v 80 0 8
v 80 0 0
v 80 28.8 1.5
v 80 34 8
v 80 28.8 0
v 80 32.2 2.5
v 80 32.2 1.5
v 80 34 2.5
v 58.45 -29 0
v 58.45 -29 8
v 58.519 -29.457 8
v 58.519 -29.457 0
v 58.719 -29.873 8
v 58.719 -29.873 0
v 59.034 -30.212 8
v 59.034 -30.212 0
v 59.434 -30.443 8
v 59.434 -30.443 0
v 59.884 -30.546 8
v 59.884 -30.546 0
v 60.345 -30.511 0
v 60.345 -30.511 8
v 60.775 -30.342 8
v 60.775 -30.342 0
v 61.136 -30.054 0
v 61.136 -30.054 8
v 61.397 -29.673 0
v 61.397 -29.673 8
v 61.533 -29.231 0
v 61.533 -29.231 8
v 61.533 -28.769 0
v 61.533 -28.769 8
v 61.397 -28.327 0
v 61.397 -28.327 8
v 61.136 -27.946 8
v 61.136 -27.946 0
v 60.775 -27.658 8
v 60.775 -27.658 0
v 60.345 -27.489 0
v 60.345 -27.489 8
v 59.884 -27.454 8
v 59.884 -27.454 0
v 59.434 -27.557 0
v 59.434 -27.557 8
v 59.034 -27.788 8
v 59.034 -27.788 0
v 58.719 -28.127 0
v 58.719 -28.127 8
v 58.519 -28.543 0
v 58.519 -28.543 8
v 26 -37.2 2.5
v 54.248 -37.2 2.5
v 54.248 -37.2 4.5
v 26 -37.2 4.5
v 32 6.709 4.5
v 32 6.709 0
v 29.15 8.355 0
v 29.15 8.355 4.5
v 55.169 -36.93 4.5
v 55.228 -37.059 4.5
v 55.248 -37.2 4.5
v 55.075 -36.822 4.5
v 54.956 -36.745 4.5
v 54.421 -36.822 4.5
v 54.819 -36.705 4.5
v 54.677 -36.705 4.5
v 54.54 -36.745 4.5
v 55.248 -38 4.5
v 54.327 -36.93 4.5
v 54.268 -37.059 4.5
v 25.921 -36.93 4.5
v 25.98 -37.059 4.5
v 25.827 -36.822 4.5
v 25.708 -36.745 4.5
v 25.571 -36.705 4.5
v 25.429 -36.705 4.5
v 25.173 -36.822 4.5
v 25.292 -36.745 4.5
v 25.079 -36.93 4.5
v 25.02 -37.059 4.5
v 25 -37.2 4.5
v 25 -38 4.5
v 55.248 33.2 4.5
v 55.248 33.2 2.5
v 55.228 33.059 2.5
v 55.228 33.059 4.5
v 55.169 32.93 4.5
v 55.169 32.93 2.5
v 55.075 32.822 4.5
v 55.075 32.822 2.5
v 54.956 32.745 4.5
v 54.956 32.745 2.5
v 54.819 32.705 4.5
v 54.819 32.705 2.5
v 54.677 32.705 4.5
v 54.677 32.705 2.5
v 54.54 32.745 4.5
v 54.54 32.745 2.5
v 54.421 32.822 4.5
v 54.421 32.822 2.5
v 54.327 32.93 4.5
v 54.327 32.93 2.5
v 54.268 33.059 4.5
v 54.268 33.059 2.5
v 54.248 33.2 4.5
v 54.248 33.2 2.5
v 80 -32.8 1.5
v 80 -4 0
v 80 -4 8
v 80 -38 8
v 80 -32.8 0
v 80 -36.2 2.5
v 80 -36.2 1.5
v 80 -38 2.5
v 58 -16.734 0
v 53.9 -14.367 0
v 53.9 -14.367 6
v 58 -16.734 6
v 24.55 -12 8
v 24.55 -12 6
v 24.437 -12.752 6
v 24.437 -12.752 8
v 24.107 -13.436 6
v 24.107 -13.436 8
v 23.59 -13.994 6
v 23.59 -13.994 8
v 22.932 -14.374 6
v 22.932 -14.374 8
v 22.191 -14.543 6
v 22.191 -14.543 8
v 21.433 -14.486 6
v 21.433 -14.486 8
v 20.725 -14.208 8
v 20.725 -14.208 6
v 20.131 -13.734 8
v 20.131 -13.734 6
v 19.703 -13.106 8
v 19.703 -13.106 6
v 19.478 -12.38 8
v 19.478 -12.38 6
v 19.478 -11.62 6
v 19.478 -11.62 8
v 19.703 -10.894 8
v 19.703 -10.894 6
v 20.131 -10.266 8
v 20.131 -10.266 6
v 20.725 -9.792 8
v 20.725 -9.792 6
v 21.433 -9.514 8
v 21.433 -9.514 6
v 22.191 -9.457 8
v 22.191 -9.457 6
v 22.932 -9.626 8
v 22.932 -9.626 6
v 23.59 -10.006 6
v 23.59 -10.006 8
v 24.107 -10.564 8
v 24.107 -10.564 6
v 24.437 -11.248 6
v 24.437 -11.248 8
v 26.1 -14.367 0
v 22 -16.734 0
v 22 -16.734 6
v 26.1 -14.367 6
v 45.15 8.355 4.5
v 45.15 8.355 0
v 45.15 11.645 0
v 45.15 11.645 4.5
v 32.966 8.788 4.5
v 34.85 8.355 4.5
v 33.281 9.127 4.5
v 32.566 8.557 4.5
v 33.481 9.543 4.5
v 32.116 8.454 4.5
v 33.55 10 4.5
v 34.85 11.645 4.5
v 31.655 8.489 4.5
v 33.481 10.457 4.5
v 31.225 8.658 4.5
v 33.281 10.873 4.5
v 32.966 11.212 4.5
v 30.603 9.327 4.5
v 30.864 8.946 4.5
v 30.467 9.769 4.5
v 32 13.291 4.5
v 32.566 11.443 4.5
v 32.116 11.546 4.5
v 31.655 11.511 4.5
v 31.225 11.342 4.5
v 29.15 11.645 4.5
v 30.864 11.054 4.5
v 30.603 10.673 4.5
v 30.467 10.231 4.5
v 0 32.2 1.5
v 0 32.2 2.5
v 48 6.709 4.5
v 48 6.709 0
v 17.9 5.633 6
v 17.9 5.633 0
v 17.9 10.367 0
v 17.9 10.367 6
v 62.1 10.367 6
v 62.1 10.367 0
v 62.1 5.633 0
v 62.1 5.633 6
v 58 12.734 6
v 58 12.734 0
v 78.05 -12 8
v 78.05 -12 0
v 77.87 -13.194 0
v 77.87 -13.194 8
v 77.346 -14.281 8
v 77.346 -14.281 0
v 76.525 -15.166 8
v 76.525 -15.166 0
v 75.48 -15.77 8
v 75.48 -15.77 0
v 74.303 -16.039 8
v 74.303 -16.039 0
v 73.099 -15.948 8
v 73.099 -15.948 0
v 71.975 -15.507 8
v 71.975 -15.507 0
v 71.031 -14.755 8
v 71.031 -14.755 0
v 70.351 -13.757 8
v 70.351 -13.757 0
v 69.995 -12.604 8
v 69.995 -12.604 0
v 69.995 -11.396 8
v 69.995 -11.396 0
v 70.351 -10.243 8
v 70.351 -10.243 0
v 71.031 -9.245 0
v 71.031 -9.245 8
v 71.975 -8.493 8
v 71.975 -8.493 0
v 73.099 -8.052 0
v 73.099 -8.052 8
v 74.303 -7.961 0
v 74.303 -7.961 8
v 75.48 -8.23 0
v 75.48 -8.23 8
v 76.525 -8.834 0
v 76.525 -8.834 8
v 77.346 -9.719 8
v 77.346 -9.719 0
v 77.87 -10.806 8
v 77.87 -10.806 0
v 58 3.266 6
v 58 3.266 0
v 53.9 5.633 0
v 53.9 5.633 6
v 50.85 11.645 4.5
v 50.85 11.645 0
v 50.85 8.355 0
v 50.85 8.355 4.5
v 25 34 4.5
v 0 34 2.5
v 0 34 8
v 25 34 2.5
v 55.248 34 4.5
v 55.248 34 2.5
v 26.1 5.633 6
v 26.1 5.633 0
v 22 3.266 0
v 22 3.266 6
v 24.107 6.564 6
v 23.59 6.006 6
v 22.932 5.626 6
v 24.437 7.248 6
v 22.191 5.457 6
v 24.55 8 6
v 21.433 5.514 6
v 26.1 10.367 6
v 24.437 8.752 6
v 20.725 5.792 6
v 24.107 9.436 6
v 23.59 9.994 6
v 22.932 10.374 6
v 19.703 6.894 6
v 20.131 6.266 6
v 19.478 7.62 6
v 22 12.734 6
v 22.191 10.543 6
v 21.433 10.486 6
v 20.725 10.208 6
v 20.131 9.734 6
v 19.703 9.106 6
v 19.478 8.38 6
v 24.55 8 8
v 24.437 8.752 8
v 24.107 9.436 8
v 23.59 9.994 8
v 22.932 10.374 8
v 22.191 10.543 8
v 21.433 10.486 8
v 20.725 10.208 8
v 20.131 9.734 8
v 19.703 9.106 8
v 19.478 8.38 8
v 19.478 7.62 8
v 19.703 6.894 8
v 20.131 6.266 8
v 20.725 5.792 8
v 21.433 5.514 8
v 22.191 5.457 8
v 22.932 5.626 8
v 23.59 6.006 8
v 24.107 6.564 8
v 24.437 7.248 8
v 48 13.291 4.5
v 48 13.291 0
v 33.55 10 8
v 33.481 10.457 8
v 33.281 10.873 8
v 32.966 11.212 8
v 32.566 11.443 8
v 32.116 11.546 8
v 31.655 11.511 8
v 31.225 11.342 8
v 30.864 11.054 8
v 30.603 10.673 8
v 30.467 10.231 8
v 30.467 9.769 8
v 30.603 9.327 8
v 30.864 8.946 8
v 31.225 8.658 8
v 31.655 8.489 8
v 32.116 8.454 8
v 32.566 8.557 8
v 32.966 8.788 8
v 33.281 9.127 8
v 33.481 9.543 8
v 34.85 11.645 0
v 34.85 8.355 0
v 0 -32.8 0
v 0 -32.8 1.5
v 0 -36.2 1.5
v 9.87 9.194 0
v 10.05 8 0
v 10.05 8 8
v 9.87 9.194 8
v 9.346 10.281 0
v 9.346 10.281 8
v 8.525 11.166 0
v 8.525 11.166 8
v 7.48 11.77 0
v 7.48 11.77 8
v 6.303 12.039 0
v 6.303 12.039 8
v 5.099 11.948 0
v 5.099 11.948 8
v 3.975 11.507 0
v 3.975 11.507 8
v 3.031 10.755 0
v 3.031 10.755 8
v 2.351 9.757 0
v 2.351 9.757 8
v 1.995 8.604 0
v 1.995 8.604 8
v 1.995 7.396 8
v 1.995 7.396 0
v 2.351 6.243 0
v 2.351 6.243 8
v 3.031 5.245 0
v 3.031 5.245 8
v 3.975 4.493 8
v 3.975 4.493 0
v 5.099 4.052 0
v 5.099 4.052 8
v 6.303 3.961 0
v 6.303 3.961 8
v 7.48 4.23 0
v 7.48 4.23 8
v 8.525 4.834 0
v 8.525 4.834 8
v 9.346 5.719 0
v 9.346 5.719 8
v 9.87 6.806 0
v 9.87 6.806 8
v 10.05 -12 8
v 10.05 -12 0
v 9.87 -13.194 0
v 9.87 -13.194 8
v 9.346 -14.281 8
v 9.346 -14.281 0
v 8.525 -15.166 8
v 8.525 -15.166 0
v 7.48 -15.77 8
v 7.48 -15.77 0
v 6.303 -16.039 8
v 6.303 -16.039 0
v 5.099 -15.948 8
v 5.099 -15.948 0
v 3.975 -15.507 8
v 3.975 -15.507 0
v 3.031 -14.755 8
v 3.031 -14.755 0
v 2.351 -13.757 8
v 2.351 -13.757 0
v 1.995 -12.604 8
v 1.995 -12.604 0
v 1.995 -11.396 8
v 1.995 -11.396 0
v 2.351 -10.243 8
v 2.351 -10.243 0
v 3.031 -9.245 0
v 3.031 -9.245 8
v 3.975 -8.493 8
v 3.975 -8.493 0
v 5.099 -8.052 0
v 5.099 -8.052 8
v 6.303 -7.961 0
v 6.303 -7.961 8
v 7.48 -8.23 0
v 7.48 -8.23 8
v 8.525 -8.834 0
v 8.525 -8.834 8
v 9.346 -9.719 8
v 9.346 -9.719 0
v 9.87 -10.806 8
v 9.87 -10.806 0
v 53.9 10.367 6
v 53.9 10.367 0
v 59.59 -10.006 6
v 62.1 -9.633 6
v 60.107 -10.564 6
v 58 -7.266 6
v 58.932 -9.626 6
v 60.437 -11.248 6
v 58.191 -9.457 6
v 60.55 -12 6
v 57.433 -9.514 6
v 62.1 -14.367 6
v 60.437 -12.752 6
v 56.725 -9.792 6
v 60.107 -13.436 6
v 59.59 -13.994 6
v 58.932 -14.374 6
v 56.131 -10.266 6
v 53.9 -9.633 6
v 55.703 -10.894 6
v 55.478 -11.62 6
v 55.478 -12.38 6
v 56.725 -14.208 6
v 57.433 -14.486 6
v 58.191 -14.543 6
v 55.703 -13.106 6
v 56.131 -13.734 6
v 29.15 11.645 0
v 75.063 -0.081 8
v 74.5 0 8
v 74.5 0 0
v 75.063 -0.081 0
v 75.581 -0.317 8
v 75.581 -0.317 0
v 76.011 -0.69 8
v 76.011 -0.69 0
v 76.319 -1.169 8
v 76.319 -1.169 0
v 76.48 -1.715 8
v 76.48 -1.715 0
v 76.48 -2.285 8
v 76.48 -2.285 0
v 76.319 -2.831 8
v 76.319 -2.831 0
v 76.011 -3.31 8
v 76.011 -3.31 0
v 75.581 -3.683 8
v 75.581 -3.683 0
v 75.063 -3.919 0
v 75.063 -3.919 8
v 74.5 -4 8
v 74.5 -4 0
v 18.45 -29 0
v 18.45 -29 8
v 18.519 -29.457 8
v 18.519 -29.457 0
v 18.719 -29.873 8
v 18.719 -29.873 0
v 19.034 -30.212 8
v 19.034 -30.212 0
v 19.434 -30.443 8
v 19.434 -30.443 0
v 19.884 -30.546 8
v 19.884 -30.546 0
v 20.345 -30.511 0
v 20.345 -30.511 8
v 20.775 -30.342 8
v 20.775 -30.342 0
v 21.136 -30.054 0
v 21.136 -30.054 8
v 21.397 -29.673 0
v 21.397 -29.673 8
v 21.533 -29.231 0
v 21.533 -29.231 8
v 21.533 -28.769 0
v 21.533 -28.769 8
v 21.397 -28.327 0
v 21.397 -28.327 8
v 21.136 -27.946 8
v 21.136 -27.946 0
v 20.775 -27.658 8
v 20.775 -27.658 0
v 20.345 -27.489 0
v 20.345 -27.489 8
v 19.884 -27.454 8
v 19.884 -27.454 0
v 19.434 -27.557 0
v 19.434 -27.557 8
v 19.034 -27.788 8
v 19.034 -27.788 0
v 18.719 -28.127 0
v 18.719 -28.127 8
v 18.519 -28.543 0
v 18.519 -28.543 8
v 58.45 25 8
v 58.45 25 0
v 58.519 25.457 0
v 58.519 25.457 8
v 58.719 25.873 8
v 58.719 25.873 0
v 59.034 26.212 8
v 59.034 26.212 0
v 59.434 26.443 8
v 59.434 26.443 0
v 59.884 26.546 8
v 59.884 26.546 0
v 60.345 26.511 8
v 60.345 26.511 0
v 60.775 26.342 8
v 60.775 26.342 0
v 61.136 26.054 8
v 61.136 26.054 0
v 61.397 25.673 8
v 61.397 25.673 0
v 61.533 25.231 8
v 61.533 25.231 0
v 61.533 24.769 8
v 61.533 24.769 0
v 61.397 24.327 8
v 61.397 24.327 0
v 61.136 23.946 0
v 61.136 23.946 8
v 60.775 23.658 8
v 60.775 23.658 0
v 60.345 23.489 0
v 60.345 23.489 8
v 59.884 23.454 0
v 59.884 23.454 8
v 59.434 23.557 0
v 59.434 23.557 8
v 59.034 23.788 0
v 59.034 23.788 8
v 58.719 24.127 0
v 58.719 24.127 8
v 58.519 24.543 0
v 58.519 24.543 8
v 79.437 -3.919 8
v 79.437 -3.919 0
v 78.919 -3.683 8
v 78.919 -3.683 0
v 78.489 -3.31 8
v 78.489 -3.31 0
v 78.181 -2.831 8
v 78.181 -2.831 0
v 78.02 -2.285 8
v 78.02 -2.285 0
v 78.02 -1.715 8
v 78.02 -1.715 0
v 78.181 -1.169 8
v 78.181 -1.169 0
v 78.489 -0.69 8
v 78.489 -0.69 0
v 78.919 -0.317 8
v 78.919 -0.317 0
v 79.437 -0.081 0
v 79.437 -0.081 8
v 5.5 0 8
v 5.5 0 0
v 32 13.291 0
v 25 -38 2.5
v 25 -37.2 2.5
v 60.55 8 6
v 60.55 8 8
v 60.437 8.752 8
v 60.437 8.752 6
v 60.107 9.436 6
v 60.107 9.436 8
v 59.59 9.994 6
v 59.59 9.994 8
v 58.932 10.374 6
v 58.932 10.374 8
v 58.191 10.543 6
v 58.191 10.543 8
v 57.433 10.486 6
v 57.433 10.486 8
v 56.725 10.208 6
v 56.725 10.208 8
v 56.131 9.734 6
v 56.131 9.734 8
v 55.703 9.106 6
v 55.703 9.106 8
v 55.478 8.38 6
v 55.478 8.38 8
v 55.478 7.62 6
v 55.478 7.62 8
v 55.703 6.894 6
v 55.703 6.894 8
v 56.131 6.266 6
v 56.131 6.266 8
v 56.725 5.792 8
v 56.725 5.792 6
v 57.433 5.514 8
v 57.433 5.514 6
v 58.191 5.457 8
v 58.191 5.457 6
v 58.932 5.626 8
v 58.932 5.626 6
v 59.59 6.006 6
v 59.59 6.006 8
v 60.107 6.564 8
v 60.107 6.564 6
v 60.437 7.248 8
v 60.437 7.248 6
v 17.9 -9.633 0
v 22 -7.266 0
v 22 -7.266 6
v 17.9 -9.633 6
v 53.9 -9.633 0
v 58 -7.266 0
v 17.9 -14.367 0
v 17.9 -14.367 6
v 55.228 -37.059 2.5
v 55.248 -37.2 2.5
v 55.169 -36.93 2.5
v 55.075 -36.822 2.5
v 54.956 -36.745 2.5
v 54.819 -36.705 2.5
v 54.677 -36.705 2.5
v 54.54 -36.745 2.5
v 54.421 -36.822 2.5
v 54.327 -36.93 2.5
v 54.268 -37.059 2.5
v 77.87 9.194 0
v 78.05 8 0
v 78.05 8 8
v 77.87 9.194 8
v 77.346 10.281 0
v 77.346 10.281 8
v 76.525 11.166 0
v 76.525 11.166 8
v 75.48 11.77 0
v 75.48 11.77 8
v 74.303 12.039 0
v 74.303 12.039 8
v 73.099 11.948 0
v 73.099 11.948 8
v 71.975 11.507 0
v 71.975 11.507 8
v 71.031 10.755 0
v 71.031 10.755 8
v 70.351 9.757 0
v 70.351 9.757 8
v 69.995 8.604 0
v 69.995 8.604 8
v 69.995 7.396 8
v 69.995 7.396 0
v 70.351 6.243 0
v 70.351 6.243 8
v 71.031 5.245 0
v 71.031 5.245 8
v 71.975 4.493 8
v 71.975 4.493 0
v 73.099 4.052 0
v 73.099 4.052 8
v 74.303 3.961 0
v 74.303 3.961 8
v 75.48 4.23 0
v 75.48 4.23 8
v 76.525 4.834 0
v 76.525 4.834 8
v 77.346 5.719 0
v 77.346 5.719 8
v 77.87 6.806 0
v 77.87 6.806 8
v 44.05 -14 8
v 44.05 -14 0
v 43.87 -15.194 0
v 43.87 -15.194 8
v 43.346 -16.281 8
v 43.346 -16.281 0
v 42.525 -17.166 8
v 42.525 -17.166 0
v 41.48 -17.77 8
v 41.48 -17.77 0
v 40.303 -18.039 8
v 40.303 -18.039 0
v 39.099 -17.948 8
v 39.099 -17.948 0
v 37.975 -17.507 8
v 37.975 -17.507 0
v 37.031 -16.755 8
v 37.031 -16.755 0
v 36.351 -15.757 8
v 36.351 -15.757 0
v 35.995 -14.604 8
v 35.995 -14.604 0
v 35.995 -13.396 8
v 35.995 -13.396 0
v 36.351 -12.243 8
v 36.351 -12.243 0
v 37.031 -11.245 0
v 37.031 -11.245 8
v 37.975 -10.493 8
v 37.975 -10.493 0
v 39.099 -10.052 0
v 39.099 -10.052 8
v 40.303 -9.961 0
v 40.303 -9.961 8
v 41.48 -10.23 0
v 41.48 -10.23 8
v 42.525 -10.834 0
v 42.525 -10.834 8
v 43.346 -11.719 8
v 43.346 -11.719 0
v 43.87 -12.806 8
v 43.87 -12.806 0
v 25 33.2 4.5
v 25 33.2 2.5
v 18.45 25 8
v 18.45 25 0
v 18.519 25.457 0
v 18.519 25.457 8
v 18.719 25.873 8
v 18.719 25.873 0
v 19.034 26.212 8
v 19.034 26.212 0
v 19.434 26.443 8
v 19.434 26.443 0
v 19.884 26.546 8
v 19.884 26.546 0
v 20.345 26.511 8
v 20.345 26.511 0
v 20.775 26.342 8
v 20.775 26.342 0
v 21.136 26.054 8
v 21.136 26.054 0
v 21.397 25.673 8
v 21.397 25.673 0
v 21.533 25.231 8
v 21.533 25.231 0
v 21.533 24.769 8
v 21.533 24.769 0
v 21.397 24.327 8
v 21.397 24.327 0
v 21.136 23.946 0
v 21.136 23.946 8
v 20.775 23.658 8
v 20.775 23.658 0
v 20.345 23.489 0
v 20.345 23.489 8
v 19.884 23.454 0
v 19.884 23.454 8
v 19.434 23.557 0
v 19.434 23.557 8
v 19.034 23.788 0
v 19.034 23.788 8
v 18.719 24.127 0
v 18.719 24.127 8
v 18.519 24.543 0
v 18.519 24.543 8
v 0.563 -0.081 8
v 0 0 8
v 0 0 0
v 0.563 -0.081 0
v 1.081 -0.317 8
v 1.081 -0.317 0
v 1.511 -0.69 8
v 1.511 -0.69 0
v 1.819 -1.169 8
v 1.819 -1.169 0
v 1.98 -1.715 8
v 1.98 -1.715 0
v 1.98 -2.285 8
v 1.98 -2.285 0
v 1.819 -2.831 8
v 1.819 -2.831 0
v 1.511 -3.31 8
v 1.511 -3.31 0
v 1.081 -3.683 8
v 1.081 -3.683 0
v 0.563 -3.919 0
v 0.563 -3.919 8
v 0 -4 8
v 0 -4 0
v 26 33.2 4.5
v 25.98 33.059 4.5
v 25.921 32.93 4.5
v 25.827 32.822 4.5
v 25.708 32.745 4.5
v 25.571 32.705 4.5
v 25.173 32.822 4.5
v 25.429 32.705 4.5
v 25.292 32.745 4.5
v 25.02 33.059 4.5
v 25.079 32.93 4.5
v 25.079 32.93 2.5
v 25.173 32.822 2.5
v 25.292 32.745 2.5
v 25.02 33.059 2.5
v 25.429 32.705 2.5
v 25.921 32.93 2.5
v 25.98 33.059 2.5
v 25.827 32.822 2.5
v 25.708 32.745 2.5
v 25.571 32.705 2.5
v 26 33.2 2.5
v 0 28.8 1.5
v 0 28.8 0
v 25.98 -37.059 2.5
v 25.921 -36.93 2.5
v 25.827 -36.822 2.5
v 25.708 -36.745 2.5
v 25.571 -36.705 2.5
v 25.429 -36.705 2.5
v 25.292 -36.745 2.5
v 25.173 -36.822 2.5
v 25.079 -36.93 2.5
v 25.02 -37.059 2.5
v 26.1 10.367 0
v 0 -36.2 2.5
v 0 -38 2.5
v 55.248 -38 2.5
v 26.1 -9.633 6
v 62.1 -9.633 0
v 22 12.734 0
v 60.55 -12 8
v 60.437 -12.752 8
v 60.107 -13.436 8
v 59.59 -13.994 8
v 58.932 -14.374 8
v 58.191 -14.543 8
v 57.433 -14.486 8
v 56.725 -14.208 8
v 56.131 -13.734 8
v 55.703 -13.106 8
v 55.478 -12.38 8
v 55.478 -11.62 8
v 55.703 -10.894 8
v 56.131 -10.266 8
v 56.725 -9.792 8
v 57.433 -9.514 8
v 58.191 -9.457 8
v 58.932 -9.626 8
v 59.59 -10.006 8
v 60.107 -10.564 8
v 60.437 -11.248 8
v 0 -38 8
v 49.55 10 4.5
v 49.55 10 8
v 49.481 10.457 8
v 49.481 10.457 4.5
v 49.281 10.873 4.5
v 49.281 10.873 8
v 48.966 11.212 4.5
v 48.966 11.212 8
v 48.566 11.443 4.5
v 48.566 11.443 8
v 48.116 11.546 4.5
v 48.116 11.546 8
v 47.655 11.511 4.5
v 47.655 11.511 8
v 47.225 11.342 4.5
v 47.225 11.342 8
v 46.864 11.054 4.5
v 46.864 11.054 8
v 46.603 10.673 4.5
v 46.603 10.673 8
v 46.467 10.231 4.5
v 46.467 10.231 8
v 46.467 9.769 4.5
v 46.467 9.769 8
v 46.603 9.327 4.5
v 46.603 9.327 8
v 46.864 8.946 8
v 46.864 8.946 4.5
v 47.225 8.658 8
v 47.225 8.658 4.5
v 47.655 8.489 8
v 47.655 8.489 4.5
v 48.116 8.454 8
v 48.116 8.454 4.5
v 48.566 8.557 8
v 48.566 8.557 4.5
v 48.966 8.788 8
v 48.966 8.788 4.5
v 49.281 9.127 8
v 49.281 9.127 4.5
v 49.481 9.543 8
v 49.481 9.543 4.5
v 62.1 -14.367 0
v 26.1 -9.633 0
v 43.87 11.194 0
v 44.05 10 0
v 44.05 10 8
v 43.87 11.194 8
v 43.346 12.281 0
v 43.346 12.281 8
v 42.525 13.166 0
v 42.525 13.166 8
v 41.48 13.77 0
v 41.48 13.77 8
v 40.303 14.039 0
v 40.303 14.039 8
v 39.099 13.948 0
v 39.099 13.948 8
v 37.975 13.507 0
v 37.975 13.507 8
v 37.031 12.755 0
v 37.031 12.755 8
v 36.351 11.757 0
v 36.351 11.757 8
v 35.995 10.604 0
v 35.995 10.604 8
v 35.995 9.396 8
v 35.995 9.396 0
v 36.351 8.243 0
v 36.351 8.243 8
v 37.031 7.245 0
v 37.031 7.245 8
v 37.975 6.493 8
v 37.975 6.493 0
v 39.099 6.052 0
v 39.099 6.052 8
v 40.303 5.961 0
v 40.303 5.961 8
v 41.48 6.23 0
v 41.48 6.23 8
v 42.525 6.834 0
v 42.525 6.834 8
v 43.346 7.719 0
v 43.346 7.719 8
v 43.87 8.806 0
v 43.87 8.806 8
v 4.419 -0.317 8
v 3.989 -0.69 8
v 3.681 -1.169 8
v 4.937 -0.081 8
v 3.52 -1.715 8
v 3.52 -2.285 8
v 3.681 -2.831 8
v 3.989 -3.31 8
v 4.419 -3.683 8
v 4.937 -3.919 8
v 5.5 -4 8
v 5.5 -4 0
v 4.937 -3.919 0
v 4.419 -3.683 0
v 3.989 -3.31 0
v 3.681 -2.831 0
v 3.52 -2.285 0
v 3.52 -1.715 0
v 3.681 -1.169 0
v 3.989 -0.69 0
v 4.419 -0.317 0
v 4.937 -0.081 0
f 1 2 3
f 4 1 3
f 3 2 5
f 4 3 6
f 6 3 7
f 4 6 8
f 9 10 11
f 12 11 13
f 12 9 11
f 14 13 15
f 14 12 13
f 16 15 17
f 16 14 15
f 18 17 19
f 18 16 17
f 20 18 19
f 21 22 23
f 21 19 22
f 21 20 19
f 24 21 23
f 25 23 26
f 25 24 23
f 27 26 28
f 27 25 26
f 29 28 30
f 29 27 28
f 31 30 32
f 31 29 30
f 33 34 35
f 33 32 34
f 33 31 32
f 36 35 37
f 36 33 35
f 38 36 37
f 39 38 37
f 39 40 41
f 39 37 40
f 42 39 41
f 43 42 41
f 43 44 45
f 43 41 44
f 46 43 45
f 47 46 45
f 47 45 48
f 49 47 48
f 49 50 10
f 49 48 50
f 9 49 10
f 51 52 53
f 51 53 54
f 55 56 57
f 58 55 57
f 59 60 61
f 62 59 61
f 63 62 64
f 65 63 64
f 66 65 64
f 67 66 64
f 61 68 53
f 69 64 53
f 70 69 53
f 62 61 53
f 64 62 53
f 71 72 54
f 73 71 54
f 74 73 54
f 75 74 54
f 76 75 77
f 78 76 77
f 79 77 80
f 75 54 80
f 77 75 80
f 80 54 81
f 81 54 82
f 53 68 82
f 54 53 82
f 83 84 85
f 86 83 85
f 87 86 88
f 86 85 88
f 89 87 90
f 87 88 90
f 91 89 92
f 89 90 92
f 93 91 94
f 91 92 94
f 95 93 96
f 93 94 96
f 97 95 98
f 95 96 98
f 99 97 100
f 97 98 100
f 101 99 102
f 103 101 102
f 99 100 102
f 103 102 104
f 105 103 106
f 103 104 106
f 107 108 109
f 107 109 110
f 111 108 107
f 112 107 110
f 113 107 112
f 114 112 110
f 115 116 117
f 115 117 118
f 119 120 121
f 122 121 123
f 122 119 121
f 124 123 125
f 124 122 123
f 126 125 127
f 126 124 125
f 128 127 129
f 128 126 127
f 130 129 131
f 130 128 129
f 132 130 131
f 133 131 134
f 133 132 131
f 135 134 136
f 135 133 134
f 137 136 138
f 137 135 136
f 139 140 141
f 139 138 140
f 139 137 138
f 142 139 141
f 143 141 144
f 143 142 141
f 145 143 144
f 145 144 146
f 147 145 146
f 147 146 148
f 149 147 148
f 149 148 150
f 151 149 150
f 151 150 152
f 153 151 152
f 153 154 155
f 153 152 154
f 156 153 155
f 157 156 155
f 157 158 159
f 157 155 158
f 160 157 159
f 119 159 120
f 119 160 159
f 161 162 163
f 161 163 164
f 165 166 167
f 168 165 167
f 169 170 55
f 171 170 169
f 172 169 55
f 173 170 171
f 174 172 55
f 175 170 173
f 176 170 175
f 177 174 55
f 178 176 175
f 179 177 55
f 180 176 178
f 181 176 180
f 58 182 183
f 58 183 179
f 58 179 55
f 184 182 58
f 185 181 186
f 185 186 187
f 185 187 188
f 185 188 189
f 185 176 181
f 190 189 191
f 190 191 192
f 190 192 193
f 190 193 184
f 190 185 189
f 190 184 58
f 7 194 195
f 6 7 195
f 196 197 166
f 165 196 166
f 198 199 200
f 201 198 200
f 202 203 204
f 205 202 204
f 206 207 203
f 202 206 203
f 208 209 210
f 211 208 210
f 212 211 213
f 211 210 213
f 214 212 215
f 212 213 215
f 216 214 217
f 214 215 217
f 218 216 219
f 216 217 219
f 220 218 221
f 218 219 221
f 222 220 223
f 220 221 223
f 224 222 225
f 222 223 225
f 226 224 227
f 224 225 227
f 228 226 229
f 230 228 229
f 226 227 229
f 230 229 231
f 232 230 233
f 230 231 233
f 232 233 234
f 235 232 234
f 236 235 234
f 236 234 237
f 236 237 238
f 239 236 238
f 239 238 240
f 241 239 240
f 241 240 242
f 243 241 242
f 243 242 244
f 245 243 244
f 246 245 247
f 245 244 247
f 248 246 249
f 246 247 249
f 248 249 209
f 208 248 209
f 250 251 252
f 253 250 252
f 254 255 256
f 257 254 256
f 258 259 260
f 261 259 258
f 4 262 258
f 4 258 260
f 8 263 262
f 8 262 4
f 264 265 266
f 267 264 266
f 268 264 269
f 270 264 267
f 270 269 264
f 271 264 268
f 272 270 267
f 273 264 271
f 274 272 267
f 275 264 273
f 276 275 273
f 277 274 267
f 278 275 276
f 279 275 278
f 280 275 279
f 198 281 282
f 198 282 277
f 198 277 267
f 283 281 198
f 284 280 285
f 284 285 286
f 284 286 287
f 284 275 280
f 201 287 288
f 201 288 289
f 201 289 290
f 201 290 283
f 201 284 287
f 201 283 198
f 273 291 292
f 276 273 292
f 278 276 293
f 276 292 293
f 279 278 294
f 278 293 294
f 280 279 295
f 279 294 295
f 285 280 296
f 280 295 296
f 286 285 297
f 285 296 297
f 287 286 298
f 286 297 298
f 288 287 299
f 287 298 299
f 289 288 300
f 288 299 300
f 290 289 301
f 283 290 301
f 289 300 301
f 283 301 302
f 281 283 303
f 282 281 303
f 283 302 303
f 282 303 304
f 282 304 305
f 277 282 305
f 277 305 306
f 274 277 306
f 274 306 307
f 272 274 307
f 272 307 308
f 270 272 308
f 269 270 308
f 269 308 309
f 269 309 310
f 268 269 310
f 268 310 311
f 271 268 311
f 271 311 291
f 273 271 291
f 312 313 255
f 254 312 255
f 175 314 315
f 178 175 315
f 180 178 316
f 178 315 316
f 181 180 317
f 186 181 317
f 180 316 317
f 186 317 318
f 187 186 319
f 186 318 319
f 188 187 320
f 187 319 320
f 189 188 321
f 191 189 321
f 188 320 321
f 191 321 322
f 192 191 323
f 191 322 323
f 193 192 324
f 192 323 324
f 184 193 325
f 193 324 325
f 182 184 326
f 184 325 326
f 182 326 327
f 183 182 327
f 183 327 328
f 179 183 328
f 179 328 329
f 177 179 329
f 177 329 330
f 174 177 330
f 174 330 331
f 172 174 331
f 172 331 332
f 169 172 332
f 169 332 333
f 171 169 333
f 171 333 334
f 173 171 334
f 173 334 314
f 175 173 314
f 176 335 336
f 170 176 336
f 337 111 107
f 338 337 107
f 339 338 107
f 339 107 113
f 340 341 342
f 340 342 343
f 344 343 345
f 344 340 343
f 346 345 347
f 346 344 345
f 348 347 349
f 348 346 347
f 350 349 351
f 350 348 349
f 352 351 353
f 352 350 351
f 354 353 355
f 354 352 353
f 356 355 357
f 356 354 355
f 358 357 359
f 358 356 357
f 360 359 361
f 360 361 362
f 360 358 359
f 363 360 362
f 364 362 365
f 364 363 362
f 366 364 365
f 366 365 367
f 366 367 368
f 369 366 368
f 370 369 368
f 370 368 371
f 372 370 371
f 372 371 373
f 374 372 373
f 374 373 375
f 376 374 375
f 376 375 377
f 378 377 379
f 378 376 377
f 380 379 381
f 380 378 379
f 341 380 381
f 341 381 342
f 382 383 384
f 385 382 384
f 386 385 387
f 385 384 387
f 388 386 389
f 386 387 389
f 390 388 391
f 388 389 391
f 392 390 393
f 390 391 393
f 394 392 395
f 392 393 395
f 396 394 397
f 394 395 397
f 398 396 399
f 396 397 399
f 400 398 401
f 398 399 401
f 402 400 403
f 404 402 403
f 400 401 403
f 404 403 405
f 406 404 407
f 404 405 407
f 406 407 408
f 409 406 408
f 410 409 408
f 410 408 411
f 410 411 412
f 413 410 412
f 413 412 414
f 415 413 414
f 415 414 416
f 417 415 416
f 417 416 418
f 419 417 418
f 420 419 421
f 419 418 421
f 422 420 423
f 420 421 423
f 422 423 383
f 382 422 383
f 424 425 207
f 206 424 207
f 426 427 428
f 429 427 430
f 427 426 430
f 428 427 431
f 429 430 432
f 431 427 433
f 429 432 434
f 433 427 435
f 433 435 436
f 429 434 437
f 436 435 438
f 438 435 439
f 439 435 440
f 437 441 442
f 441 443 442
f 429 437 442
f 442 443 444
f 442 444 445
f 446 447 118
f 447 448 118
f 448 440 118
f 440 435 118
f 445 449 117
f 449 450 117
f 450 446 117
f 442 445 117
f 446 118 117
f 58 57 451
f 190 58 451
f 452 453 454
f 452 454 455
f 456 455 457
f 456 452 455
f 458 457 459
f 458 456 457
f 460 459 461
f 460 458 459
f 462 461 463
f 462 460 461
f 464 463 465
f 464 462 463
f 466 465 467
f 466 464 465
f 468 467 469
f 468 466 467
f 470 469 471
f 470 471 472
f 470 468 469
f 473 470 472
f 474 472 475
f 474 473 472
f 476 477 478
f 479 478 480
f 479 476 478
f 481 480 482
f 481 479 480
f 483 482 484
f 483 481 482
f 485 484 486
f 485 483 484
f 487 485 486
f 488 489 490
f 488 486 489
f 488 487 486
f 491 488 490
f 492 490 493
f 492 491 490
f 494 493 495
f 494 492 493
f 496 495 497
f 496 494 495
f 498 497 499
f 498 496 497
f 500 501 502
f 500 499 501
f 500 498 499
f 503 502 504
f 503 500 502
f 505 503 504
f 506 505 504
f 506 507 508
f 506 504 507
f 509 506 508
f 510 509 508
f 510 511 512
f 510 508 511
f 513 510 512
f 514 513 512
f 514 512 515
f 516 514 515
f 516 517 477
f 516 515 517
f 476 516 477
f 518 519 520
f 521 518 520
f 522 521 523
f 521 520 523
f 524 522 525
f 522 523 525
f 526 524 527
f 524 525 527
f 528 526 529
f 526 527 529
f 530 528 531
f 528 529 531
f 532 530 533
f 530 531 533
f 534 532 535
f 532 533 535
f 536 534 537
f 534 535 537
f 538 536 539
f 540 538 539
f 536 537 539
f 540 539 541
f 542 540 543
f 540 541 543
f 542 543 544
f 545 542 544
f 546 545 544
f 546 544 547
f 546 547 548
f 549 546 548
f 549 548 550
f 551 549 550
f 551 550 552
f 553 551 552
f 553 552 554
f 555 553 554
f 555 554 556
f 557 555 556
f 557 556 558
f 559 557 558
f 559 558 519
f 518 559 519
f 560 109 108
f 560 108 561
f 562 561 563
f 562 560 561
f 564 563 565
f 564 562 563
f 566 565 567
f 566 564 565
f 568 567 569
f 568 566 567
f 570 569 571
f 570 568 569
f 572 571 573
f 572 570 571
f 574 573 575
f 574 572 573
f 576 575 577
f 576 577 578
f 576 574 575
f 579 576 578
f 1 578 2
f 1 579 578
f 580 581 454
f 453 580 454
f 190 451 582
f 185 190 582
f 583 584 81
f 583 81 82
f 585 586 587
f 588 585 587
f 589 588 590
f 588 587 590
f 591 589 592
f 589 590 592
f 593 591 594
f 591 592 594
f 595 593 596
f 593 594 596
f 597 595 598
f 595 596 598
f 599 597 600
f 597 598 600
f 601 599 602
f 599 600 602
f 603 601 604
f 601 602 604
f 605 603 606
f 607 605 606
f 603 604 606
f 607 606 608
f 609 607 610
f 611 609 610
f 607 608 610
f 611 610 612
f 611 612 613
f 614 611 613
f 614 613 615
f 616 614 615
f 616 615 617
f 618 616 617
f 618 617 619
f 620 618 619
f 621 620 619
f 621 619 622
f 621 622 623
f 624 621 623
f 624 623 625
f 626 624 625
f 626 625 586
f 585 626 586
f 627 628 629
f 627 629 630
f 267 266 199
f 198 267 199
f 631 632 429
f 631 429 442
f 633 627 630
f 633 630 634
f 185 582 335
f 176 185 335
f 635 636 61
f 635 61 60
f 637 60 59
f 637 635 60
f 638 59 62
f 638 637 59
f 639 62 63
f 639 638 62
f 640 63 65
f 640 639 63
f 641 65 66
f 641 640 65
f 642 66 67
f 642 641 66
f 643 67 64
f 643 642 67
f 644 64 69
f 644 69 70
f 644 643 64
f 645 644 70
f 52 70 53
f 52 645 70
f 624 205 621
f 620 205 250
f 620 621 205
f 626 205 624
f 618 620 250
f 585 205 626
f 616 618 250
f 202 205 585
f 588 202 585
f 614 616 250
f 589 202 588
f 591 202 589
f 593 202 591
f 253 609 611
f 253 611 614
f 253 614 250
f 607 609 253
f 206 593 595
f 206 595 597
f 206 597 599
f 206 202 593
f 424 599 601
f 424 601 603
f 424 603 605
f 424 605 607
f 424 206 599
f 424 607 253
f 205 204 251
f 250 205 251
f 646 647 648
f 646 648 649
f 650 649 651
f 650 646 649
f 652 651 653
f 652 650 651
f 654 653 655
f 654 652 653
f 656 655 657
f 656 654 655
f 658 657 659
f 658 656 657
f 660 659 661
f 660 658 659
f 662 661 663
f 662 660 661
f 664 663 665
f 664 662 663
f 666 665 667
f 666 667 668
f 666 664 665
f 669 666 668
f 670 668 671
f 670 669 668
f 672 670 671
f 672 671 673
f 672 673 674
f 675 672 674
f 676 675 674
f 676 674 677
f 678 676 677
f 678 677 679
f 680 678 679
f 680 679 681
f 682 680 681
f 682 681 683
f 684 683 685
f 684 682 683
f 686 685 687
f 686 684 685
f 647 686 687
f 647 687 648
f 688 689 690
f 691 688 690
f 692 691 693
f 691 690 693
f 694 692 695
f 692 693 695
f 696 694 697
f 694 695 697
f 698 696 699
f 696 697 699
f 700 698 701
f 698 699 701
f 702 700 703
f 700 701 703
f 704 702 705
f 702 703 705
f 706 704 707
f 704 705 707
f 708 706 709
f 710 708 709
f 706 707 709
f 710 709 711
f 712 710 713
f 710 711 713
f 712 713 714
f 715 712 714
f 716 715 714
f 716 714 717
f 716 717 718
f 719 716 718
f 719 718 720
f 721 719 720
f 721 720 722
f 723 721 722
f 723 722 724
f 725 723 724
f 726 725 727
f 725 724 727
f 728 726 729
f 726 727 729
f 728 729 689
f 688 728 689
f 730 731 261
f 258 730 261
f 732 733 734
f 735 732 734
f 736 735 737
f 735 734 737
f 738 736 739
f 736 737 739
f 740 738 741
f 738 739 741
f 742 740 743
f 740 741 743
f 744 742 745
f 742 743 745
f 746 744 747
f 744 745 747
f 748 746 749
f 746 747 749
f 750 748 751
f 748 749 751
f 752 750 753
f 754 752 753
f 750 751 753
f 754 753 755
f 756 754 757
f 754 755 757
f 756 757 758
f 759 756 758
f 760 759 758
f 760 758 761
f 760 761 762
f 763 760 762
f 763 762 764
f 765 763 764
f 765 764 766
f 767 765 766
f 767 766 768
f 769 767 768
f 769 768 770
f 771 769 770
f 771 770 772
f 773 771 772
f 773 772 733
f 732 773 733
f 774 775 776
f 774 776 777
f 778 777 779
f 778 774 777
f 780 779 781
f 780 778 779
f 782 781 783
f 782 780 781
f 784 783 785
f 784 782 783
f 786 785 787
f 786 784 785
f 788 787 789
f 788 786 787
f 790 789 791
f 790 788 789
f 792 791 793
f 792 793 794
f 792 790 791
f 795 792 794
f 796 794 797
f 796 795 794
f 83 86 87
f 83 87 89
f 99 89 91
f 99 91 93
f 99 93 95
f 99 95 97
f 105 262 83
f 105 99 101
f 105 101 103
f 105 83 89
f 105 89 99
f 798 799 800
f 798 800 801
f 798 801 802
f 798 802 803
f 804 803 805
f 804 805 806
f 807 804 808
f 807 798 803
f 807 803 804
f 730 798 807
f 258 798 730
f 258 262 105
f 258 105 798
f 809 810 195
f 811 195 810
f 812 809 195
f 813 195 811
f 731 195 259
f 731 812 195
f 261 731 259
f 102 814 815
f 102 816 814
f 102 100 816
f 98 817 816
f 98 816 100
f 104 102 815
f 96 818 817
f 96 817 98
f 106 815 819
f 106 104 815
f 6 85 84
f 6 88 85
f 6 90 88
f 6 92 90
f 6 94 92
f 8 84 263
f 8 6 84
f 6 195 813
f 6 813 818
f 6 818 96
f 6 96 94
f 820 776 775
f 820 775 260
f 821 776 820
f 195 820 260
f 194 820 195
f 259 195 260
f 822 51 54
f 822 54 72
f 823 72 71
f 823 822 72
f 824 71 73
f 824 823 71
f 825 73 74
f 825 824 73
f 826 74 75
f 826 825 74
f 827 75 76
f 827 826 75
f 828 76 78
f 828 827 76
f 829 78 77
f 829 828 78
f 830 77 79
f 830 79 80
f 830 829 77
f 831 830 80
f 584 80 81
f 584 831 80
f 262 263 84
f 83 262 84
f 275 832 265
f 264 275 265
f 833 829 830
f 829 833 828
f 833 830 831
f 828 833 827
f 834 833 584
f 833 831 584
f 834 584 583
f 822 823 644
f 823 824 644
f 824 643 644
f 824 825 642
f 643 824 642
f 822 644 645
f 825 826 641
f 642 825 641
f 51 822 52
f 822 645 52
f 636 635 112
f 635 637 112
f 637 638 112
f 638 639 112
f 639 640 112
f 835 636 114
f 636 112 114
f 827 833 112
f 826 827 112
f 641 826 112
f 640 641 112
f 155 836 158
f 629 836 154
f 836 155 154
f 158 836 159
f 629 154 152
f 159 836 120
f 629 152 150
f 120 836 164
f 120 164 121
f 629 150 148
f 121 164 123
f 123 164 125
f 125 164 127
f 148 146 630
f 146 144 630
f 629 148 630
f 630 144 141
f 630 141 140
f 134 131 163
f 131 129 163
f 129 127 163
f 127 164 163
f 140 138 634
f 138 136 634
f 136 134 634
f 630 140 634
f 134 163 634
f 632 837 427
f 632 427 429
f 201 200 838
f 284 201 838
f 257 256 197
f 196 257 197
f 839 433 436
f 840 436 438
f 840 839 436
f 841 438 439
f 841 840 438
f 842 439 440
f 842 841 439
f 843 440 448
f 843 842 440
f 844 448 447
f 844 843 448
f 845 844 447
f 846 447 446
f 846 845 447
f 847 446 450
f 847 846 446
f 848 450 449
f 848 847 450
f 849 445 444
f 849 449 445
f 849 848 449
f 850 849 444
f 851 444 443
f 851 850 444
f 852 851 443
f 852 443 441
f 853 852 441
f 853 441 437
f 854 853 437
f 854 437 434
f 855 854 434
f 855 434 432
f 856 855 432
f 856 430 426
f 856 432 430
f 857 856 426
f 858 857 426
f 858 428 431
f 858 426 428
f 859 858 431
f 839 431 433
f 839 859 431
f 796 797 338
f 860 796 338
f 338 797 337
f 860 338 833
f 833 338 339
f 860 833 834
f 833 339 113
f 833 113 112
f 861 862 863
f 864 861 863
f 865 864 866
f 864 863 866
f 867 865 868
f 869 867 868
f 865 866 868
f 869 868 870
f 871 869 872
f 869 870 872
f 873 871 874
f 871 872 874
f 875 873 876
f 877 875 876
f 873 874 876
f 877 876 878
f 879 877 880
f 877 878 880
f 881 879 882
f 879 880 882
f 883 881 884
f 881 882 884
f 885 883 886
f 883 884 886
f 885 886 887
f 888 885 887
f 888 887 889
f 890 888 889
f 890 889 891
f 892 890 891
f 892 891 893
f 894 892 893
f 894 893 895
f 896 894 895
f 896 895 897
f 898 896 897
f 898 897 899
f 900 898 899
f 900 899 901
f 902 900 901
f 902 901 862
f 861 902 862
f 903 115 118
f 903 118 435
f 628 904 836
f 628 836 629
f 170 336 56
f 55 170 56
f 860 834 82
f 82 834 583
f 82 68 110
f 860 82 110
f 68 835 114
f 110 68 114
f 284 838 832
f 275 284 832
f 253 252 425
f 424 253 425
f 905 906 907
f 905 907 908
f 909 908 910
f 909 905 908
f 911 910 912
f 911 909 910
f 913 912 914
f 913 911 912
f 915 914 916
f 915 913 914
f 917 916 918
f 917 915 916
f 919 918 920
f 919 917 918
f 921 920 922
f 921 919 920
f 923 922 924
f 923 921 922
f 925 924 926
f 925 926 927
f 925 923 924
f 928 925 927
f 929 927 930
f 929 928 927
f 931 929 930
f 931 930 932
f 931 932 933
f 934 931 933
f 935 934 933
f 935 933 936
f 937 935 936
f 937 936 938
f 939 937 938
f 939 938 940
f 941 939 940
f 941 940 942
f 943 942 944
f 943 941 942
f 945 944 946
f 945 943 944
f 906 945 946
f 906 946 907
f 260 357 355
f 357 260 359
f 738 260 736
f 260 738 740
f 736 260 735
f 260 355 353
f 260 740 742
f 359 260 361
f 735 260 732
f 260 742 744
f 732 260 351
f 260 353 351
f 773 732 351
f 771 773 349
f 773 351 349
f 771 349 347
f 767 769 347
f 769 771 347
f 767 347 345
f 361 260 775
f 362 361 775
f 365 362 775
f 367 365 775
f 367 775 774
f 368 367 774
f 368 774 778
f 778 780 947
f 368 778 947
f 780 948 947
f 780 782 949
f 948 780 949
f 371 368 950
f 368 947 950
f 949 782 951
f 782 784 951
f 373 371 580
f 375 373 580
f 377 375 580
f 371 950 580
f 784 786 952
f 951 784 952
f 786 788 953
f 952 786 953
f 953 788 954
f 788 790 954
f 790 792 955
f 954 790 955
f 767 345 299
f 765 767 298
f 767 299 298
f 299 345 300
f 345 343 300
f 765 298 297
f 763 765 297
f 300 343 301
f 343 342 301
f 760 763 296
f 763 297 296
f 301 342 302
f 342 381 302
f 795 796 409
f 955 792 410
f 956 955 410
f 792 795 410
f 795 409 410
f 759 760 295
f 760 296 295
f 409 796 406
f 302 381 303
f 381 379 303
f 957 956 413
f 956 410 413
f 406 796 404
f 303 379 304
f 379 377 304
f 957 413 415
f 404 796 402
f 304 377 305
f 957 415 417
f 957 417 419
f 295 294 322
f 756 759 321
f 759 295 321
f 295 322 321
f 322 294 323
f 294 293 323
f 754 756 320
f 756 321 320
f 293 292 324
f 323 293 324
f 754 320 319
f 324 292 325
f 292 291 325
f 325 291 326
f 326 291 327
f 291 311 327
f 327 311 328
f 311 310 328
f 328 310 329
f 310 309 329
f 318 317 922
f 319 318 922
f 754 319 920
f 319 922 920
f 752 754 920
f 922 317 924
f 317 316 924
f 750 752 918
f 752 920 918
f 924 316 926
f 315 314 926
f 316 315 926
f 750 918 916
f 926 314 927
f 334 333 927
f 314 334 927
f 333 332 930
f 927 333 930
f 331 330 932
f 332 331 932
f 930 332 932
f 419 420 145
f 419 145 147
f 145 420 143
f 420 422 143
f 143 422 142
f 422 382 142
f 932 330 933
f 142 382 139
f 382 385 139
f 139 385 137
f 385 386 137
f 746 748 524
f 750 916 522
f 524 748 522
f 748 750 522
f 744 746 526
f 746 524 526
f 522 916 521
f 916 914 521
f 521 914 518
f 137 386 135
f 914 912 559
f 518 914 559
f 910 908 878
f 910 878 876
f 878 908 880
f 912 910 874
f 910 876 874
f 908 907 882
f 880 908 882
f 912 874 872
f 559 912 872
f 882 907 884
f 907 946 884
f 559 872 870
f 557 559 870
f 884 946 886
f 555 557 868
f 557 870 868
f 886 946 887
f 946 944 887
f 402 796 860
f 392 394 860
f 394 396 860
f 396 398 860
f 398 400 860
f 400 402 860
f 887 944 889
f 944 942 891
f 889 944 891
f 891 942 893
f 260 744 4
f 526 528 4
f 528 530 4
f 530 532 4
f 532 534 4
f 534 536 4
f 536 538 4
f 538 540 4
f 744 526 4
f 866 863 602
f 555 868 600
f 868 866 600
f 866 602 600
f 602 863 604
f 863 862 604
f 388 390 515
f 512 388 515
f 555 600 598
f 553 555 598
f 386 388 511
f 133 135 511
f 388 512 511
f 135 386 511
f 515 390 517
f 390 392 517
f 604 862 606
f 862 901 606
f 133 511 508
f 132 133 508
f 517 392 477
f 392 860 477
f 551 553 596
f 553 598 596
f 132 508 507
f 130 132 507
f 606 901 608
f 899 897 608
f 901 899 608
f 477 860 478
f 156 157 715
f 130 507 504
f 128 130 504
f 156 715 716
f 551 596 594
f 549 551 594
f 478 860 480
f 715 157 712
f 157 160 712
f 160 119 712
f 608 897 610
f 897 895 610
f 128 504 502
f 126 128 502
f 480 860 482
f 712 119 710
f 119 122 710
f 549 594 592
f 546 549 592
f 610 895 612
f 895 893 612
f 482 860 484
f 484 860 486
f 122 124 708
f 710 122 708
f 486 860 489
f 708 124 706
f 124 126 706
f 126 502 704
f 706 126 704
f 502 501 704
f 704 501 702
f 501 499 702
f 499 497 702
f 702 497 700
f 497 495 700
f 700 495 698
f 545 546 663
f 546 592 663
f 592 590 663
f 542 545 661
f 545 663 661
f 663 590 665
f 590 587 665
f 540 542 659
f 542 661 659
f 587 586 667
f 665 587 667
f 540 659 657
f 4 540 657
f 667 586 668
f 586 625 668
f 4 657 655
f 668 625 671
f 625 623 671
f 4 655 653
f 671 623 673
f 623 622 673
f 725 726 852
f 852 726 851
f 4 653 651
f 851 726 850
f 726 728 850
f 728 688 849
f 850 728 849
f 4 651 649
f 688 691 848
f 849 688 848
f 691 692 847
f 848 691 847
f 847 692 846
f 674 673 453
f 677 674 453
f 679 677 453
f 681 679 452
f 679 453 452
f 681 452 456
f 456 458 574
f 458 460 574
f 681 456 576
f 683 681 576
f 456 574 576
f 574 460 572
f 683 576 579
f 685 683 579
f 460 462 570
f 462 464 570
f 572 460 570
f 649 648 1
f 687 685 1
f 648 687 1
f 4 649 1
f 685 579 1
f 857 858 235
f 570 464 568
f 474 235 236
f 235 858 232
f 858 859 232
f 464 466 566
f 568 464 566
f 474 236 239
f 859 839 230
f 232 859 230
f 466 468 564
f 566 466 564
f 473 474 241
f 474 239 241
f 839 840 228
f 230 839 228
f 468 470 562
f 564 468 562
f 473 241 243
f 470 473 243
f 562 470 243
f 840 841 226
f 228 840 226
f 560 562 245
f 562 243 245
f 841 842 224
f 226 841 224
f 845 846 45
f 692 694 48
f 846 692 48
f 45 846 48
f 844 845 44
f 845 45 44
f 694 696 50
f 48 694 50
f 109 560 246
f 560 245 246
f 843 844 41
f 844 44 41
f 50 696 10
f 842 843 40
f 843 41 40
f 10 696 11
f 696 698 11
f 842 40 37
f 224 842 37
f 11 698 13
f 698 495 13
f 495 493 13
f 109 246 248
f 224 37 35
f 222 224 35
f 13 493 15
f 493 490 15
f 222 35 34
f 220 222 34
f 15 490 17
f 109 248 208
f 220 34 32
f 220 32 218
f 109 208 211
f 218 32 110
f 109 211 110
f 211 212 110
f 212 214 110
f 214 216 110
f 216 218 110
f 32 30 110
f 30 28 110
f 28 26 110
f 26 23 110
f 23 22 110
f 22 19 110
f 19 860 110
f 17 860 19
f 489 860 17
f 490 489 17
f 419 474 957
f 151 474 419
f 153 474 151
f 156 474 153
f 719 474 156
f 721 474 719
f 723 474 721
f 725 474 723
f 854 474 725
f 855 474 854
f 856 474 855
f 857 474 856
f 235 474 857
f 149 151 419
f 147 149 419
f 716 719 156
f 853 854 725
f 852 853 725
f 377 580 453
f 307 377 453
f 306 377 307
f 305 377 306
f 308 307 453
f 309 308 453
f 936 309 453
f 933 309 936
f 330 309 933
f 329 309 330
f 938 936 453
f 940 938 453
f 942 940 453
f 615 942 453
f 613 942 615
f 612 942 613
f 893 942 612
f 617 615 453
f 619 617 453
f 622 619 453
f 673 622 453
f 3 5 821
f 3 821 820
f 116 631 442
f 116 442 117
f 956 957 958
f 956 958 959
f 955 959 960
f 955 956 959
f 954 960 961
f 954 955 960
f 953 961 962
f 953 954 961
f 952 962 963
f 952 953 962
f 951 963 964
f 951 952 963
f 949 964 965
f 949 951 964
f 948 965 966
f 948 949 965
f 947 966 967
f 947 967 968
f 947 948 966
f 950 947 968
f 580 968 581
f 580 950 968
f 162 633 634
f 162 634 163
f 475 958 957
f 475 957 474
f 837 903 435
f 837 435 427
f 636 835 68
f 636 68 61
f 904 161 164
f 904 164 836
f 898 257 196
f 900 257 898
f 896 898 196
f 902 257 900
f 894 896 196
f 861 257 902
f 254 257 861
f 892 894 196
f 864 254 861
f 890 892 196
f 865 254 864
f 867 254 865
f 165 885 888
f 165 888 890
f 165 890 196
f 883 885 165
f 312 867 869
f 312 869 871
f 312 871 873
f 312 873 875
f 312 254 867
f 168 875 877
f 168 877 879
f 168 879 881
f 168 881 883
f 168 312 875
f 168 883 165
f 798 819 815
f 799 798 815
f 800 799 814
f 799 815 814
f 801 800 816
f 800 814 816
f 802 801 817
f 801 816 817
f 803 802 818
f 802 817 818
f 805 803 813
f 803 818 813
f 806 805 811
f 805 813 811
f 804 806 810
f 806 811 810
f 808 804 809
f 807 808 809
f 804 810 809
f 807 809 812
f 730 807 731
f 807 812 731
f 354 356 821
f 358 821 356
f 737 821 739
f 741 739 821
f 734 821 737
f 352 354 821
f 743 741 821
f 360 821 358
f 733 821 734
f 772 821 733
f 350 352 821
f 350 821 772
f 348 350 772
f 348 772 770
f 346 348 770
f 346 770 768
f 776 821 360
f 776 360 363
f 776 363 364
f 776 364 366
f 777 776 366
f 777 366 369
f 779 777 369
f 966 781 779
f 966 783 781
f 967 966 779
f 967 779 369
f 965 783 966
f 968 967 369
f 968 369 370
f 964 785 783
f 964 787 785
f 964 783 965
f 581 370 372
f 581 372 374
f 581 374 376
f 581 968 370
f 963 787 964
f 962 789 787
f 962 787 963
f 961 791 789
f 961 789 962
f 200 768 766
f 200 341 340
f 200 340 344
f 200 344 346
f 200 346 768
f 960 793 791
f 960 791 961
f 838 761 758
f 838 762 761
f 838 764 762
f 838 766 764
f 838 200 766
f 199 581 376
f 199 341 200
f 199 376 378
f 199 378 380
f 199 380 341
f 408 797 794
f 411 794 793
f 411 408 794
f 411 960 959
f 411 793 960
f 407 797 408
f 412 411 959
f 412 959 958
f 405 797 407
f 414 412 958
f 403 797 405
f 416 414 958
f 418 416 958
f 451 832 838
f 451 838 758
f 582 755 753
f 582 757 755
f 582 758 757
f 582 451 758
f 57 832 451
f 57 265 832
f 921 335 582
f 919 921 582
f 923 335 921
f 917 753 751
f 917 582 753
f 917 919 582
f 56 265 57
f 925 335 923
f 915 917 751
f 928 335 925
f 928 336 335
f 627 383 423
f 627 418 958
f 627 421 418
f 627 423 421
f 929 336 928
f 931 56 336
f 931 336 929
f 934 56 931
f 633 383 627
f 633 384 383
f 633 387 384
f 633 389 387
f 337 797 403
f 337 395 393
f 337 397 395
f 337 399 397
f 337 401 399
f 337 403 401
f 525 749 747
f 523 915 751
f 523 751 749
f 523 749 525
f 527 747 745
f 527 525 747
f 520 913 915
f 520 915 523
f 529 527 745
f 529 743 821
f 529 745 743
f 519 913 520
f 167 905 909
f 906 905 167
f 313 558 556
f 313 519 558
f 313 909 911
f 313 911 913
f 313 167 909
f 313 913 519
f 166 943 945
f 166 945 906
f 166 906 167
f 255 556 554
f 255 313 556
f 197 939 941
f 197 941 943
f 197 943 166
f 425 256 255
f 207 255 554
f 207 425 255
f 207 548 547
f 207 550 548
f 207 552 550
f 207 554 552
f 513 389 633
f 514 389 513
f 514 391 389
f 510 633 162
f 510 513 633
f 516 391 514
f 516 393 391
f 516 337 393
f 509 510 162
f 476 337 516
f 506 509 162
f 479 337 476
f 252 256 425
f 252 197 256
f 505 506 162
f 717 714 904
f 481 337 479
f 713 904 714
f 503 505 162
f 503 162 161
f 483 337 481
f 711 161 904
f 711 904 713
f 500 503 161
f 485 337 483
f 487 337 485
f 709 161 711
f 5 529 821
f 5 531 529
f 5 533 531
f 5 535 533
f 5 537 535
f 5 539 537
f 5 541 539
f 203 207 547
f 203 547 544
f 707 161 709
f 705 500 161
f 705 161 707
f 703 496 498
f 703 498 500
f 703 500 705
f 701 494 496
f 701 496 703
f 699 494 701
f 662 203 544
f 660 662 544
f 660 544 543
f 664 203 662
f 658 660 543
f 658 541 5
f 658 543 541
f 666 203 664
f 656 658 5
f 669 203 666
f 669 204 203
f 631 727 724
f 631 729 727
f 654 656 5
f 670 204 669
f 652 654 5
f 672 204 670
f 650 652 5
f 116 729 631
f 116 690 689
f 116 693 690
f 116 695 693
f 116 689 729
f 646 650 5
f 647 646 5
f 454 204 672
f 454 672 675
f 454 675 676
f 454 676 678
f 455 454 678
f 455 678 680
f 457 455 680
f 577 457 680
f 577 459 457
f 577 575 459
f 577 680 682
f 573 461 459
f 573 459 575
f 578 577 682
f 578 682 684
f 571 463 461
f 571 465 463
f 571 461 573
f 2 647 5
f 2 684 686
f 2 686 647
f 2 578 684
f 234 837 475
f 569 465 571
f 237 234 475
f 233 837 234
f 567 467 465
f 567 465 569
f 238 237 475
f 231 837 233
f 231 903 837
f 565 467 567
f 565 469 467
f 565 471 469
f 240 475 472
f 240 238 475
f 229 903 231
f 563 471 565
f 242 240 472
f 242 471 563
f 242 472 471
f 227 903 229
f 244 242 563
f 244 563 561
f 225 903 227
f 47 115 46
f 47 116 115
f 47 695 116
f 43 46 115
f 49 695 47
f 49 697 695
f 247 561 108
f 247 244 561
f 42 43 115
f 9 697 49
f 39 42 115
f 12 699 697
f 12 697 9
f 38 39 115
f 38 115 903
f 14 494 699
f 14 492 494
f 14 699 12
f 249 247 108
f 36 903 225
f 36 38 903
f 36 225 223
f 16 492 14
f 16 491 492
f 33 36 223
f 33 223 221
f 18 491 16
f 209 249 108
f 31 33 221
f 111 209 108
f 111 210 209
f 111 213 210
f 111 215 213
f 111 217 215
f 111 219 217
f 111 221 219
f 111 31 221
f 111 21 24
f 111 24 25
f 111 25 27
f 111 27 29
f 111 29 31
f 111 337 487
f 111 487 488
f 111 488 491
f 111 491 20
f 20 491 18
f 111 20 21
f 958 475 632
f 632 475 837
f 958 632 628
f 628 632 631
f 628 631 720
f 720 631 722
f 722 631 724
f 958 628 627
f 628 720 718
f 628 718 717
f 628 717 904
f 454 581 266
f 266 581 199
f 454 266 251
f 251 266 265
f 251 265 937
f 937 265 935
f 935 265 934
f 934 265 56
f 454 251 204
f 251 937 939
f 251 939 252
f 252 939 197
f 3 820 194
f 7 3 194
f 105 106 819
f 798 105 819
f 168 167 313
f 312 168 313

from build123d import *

# Parameters (mm, degrees)
SKETCH_2_W           = 80
SKETCH_2_H           = 34
SKETCH_2_R           = 4.05
EXTRUDE_1_DEPTH      = 8
SKETCH_3_R           = 2.55
CUT_EXTRUDE_1_DEPTH  = 88.292611371
CUT_EXTRUDE_2_DEPTH  = 88.292611371
SKETCH_5_R           = 1.55
CUT_EXTRUDE_3_DEPTH  = 88.292611371
CUT_EXTRUDE_4_DEPTH  = 6
CUT_EXTRUDE_5_DEPTH  = 4.5
SKETCH_25_R          = 1.55
CUT_EXTRUDE_13_DEPTH = 88.292611371
CUT_EXTRUDE_11_DEPTH = 2
EXTRUDE_2_DEPTH      = 8


with BuildPart() as part:
    # 草图2 → 凸台-拉伸1 (new body)
    with BuildSketch(Plane.XY):
        with Locations((40, 17)):
            Rectangle(SKETCH_2_W, SKETCH_2_H)
        with Locations((6, 8)):
            Circle(SKETCH_2_R, mode=Mode.SUBTRACT)
        with Locations((40, 10)):
            Circle(SKETCH_2_R, mode=Mode.SUBTRACT)
        with Locations((74, 8)):
            Circle(SKETCH_2_R, mode=Mode.SUBTRACT)
    extrude_1 = extrude(amount=EXTRUDE_1_DEPTH)

    # 草图3 → 切除-拉伸1 (cut, through all)
    with BuildSketch(Plane.XY.offset(8)):
        with Locations((22, 8)):
            Circle(SKETCH_3_R)
        with Locations((58, 8)):
            Circle(SKETCH_3_R)
    cut_extrude_1 = extrude(amount=-CUT_EXTRUDE_1_DEPTH, mode=Mode.SUBTRACT)

    # 草图4 → 切除-拉伸2 (cut, through all)
    with BuildSketch(Plane(origin=(80, 0, 0), x_dir=(0, 0, -1), z_dir=(1, 0, 0))):
        Polygon((-1.5, 32.2), (-2.5, 32.2), (-2.5, 34), (0, 34), (0, 28.8), (-1.5, 28.8), align=None)
    cut_extrude_2 = extrude(amount=-CUT_EXTRUDE_2_DEPTH, mode=Mode.SUBTRACT)

    # 草图5 → 切除-拉伸3 (cut, through all)
    with BuildSketch(Plane.XY.offset(8)):
        with Locations((48, 10)):
            Circle(SKETCH_5_R)
        with Locations((32, 10)):
            Circle(SKETCH_5_R)
    extrude(amount=-CUT_EXTRUDE_3_DEPTH, mode=Mode.SUBTRACT)

    # 草图7 → 切除-拉伸4 (cut)
    with BuildSketch(Plane(origin=(0, 0, 0), x_dir=(-1, 0, 0), z_dir=(0, 0, -1))):
        Polygon((-53.9, 5.632863896), (-53.9, 10.367136104), (-58, 12.734272207), (-62.1, 10.367136104), (-62.1, 5.632863896), (-58, 3.265727793), align=None)
        Polygon((-26.1, 5.632863896), (-22, 3.265727793), (-17.9, 5.632863896), (-17.9, 10.367136104), (-22, 12.734272207), (-26.1, 10.367136104), align=None)
    cut_extrude_4 = extrude(amount=-CUT_EXTRUDE_4_DEPTH, mode=Mode.SUBTRACT)

    # 草图8 → 切除-拉伸5 (cut)
    with BuildSketch(Plane(origin=(0, 0, 0), x_dir=(-1, 0, 0), z_dir=(0, 0, -1))):
        Polygon((-48, 6.709103466), (-45.15, 8.354551733), (-45.15, 11.645448267), (-48, 13.290896534), (-50.85, 11.645448267), (-50.85, 8.354551733), align=None)
        Polygon((-32, 6.709103466), (-29.15, 8.354551733), (-29.15, 11.645448267), (-32, 13.290896534), (-34.85, 11.645448267), (-34.85, 8.354551733), align=None)
    extrude(amount=-CUT_EXTRUDE_5_DEPTH, mode=Mode.SUBTRACT)

    # 草图25 → 切除-拉伸13 (cut, through all)
    with BuildSketch(Plane(origin=(0, 0, 0), x_dir=(-1, 0, 0), z_dir=(0, 0, -1))):
        with Locations((-60, 25)):
            Circle(SKETCH_25_R)
        with Locations((-20, 25)):
            Circle(SKETCH_25_R)
    cut_extrude_13 = extrude(amount=-CUT_EXTRUDE_13_DEPTH, mode=Mode.SUBTRACT)

    # 草图19 → 切除-拉伸11 (cut)
    with BuildSketch(Plane(origin=(0, 0, 2.5), x_dir=(-1, 0, 0), z_dir=(0, 0, -1))):
        with BuildLine():
            Line((-25, 34), (-55.247938178, 34))
            Line((-55.247938178, 34), (-55.247938178, 33.2))
            ThreePointArc((-55.247938178, 33.2), (-54.747938178, 32.7), (-54.247938178, 33.2))
            Line((-54.247938178, 33.2), (-26, 33.2))
            ThreePointArc((-26, 33.2), (-25.5, 32.7), (-25, 33.2))
            Line((-25, 33.2), (-25, 34))
        make_face()
    cut_extrude_11 = extrude(amount=-CUT_EXTRUDE_11_DEPTH, mode=Mode.SUBTRACT)

    # 草图22 → 凸台-拉伸2 (add)
    with BuildSketch(Plane.XY.offset(8)):
        with BuildLine():
            Line((0, -4), (5.5, -4))
            ThreePointArc((5.5, -4), (3.5, -2), (5.5, 0))
            Line((5.5, 0), (0, 0))
            ThreePointArc((0, 0), (2, -2), (0, -4))
        make_face()
        with BuildLine():
            Line((80, 0), (74.5, 0))
            ThreePointArc((74.5, 0), (76.5, -2), (74.5, -4))
            Line((74.5, -4), (80, -4))
            ThreePointArc((80, -4), (78, -2), (80, 0))
        make_face()
    extrude(amount=-EXTRUDE_2_DEPTH)

    # 镜向2: 凸台-拉伸1, 切除-拉伸1, 切除-拉伸2, 切除-拉伸4, 切除-拉伸13, 切除-拉伸11 across plane
    add(extrude_1.mirror(Plane(origin=(0, -2, 0), x_dir=(0, 0, 1), z_dir=(0, -1, 0))))
    add(cut_extrude_1.mirror(Plane(origin=(0, -2, 0), x_dir=(0, 0, 1), z_dir=(0, -1, 0))), mode=Mode.SUBTRACT)
    add(cut_extrude_2.mirror(Plane(origin=(0, -2, 0), x_dir=(0, 0, 1), z_dir=(0, -1, 0))), mode=Mode.SUBTRACT)
    add(cut_extrude_4.mirror(Plane(origin=(0, -2, 0), x_dir=(0, 0, 1), z_dir=(0, -1, 0))), mode=Mode.SUBTRACT)
    add(cut_extrude_13.mirror(Plane(origin=(0, -2, 0), x_dir=(0, 0, 1), z_dir=(0, -1, 0))), mode=Mode.SUBTRACT)
    add(cut_extrude_11.mirror(Plane(origin=(0, -2, 0), x_dir=(0, 0, 1), z_dir=(0, -1, 0))), mode=Mode.SUBTRACT)


solid = part.part
